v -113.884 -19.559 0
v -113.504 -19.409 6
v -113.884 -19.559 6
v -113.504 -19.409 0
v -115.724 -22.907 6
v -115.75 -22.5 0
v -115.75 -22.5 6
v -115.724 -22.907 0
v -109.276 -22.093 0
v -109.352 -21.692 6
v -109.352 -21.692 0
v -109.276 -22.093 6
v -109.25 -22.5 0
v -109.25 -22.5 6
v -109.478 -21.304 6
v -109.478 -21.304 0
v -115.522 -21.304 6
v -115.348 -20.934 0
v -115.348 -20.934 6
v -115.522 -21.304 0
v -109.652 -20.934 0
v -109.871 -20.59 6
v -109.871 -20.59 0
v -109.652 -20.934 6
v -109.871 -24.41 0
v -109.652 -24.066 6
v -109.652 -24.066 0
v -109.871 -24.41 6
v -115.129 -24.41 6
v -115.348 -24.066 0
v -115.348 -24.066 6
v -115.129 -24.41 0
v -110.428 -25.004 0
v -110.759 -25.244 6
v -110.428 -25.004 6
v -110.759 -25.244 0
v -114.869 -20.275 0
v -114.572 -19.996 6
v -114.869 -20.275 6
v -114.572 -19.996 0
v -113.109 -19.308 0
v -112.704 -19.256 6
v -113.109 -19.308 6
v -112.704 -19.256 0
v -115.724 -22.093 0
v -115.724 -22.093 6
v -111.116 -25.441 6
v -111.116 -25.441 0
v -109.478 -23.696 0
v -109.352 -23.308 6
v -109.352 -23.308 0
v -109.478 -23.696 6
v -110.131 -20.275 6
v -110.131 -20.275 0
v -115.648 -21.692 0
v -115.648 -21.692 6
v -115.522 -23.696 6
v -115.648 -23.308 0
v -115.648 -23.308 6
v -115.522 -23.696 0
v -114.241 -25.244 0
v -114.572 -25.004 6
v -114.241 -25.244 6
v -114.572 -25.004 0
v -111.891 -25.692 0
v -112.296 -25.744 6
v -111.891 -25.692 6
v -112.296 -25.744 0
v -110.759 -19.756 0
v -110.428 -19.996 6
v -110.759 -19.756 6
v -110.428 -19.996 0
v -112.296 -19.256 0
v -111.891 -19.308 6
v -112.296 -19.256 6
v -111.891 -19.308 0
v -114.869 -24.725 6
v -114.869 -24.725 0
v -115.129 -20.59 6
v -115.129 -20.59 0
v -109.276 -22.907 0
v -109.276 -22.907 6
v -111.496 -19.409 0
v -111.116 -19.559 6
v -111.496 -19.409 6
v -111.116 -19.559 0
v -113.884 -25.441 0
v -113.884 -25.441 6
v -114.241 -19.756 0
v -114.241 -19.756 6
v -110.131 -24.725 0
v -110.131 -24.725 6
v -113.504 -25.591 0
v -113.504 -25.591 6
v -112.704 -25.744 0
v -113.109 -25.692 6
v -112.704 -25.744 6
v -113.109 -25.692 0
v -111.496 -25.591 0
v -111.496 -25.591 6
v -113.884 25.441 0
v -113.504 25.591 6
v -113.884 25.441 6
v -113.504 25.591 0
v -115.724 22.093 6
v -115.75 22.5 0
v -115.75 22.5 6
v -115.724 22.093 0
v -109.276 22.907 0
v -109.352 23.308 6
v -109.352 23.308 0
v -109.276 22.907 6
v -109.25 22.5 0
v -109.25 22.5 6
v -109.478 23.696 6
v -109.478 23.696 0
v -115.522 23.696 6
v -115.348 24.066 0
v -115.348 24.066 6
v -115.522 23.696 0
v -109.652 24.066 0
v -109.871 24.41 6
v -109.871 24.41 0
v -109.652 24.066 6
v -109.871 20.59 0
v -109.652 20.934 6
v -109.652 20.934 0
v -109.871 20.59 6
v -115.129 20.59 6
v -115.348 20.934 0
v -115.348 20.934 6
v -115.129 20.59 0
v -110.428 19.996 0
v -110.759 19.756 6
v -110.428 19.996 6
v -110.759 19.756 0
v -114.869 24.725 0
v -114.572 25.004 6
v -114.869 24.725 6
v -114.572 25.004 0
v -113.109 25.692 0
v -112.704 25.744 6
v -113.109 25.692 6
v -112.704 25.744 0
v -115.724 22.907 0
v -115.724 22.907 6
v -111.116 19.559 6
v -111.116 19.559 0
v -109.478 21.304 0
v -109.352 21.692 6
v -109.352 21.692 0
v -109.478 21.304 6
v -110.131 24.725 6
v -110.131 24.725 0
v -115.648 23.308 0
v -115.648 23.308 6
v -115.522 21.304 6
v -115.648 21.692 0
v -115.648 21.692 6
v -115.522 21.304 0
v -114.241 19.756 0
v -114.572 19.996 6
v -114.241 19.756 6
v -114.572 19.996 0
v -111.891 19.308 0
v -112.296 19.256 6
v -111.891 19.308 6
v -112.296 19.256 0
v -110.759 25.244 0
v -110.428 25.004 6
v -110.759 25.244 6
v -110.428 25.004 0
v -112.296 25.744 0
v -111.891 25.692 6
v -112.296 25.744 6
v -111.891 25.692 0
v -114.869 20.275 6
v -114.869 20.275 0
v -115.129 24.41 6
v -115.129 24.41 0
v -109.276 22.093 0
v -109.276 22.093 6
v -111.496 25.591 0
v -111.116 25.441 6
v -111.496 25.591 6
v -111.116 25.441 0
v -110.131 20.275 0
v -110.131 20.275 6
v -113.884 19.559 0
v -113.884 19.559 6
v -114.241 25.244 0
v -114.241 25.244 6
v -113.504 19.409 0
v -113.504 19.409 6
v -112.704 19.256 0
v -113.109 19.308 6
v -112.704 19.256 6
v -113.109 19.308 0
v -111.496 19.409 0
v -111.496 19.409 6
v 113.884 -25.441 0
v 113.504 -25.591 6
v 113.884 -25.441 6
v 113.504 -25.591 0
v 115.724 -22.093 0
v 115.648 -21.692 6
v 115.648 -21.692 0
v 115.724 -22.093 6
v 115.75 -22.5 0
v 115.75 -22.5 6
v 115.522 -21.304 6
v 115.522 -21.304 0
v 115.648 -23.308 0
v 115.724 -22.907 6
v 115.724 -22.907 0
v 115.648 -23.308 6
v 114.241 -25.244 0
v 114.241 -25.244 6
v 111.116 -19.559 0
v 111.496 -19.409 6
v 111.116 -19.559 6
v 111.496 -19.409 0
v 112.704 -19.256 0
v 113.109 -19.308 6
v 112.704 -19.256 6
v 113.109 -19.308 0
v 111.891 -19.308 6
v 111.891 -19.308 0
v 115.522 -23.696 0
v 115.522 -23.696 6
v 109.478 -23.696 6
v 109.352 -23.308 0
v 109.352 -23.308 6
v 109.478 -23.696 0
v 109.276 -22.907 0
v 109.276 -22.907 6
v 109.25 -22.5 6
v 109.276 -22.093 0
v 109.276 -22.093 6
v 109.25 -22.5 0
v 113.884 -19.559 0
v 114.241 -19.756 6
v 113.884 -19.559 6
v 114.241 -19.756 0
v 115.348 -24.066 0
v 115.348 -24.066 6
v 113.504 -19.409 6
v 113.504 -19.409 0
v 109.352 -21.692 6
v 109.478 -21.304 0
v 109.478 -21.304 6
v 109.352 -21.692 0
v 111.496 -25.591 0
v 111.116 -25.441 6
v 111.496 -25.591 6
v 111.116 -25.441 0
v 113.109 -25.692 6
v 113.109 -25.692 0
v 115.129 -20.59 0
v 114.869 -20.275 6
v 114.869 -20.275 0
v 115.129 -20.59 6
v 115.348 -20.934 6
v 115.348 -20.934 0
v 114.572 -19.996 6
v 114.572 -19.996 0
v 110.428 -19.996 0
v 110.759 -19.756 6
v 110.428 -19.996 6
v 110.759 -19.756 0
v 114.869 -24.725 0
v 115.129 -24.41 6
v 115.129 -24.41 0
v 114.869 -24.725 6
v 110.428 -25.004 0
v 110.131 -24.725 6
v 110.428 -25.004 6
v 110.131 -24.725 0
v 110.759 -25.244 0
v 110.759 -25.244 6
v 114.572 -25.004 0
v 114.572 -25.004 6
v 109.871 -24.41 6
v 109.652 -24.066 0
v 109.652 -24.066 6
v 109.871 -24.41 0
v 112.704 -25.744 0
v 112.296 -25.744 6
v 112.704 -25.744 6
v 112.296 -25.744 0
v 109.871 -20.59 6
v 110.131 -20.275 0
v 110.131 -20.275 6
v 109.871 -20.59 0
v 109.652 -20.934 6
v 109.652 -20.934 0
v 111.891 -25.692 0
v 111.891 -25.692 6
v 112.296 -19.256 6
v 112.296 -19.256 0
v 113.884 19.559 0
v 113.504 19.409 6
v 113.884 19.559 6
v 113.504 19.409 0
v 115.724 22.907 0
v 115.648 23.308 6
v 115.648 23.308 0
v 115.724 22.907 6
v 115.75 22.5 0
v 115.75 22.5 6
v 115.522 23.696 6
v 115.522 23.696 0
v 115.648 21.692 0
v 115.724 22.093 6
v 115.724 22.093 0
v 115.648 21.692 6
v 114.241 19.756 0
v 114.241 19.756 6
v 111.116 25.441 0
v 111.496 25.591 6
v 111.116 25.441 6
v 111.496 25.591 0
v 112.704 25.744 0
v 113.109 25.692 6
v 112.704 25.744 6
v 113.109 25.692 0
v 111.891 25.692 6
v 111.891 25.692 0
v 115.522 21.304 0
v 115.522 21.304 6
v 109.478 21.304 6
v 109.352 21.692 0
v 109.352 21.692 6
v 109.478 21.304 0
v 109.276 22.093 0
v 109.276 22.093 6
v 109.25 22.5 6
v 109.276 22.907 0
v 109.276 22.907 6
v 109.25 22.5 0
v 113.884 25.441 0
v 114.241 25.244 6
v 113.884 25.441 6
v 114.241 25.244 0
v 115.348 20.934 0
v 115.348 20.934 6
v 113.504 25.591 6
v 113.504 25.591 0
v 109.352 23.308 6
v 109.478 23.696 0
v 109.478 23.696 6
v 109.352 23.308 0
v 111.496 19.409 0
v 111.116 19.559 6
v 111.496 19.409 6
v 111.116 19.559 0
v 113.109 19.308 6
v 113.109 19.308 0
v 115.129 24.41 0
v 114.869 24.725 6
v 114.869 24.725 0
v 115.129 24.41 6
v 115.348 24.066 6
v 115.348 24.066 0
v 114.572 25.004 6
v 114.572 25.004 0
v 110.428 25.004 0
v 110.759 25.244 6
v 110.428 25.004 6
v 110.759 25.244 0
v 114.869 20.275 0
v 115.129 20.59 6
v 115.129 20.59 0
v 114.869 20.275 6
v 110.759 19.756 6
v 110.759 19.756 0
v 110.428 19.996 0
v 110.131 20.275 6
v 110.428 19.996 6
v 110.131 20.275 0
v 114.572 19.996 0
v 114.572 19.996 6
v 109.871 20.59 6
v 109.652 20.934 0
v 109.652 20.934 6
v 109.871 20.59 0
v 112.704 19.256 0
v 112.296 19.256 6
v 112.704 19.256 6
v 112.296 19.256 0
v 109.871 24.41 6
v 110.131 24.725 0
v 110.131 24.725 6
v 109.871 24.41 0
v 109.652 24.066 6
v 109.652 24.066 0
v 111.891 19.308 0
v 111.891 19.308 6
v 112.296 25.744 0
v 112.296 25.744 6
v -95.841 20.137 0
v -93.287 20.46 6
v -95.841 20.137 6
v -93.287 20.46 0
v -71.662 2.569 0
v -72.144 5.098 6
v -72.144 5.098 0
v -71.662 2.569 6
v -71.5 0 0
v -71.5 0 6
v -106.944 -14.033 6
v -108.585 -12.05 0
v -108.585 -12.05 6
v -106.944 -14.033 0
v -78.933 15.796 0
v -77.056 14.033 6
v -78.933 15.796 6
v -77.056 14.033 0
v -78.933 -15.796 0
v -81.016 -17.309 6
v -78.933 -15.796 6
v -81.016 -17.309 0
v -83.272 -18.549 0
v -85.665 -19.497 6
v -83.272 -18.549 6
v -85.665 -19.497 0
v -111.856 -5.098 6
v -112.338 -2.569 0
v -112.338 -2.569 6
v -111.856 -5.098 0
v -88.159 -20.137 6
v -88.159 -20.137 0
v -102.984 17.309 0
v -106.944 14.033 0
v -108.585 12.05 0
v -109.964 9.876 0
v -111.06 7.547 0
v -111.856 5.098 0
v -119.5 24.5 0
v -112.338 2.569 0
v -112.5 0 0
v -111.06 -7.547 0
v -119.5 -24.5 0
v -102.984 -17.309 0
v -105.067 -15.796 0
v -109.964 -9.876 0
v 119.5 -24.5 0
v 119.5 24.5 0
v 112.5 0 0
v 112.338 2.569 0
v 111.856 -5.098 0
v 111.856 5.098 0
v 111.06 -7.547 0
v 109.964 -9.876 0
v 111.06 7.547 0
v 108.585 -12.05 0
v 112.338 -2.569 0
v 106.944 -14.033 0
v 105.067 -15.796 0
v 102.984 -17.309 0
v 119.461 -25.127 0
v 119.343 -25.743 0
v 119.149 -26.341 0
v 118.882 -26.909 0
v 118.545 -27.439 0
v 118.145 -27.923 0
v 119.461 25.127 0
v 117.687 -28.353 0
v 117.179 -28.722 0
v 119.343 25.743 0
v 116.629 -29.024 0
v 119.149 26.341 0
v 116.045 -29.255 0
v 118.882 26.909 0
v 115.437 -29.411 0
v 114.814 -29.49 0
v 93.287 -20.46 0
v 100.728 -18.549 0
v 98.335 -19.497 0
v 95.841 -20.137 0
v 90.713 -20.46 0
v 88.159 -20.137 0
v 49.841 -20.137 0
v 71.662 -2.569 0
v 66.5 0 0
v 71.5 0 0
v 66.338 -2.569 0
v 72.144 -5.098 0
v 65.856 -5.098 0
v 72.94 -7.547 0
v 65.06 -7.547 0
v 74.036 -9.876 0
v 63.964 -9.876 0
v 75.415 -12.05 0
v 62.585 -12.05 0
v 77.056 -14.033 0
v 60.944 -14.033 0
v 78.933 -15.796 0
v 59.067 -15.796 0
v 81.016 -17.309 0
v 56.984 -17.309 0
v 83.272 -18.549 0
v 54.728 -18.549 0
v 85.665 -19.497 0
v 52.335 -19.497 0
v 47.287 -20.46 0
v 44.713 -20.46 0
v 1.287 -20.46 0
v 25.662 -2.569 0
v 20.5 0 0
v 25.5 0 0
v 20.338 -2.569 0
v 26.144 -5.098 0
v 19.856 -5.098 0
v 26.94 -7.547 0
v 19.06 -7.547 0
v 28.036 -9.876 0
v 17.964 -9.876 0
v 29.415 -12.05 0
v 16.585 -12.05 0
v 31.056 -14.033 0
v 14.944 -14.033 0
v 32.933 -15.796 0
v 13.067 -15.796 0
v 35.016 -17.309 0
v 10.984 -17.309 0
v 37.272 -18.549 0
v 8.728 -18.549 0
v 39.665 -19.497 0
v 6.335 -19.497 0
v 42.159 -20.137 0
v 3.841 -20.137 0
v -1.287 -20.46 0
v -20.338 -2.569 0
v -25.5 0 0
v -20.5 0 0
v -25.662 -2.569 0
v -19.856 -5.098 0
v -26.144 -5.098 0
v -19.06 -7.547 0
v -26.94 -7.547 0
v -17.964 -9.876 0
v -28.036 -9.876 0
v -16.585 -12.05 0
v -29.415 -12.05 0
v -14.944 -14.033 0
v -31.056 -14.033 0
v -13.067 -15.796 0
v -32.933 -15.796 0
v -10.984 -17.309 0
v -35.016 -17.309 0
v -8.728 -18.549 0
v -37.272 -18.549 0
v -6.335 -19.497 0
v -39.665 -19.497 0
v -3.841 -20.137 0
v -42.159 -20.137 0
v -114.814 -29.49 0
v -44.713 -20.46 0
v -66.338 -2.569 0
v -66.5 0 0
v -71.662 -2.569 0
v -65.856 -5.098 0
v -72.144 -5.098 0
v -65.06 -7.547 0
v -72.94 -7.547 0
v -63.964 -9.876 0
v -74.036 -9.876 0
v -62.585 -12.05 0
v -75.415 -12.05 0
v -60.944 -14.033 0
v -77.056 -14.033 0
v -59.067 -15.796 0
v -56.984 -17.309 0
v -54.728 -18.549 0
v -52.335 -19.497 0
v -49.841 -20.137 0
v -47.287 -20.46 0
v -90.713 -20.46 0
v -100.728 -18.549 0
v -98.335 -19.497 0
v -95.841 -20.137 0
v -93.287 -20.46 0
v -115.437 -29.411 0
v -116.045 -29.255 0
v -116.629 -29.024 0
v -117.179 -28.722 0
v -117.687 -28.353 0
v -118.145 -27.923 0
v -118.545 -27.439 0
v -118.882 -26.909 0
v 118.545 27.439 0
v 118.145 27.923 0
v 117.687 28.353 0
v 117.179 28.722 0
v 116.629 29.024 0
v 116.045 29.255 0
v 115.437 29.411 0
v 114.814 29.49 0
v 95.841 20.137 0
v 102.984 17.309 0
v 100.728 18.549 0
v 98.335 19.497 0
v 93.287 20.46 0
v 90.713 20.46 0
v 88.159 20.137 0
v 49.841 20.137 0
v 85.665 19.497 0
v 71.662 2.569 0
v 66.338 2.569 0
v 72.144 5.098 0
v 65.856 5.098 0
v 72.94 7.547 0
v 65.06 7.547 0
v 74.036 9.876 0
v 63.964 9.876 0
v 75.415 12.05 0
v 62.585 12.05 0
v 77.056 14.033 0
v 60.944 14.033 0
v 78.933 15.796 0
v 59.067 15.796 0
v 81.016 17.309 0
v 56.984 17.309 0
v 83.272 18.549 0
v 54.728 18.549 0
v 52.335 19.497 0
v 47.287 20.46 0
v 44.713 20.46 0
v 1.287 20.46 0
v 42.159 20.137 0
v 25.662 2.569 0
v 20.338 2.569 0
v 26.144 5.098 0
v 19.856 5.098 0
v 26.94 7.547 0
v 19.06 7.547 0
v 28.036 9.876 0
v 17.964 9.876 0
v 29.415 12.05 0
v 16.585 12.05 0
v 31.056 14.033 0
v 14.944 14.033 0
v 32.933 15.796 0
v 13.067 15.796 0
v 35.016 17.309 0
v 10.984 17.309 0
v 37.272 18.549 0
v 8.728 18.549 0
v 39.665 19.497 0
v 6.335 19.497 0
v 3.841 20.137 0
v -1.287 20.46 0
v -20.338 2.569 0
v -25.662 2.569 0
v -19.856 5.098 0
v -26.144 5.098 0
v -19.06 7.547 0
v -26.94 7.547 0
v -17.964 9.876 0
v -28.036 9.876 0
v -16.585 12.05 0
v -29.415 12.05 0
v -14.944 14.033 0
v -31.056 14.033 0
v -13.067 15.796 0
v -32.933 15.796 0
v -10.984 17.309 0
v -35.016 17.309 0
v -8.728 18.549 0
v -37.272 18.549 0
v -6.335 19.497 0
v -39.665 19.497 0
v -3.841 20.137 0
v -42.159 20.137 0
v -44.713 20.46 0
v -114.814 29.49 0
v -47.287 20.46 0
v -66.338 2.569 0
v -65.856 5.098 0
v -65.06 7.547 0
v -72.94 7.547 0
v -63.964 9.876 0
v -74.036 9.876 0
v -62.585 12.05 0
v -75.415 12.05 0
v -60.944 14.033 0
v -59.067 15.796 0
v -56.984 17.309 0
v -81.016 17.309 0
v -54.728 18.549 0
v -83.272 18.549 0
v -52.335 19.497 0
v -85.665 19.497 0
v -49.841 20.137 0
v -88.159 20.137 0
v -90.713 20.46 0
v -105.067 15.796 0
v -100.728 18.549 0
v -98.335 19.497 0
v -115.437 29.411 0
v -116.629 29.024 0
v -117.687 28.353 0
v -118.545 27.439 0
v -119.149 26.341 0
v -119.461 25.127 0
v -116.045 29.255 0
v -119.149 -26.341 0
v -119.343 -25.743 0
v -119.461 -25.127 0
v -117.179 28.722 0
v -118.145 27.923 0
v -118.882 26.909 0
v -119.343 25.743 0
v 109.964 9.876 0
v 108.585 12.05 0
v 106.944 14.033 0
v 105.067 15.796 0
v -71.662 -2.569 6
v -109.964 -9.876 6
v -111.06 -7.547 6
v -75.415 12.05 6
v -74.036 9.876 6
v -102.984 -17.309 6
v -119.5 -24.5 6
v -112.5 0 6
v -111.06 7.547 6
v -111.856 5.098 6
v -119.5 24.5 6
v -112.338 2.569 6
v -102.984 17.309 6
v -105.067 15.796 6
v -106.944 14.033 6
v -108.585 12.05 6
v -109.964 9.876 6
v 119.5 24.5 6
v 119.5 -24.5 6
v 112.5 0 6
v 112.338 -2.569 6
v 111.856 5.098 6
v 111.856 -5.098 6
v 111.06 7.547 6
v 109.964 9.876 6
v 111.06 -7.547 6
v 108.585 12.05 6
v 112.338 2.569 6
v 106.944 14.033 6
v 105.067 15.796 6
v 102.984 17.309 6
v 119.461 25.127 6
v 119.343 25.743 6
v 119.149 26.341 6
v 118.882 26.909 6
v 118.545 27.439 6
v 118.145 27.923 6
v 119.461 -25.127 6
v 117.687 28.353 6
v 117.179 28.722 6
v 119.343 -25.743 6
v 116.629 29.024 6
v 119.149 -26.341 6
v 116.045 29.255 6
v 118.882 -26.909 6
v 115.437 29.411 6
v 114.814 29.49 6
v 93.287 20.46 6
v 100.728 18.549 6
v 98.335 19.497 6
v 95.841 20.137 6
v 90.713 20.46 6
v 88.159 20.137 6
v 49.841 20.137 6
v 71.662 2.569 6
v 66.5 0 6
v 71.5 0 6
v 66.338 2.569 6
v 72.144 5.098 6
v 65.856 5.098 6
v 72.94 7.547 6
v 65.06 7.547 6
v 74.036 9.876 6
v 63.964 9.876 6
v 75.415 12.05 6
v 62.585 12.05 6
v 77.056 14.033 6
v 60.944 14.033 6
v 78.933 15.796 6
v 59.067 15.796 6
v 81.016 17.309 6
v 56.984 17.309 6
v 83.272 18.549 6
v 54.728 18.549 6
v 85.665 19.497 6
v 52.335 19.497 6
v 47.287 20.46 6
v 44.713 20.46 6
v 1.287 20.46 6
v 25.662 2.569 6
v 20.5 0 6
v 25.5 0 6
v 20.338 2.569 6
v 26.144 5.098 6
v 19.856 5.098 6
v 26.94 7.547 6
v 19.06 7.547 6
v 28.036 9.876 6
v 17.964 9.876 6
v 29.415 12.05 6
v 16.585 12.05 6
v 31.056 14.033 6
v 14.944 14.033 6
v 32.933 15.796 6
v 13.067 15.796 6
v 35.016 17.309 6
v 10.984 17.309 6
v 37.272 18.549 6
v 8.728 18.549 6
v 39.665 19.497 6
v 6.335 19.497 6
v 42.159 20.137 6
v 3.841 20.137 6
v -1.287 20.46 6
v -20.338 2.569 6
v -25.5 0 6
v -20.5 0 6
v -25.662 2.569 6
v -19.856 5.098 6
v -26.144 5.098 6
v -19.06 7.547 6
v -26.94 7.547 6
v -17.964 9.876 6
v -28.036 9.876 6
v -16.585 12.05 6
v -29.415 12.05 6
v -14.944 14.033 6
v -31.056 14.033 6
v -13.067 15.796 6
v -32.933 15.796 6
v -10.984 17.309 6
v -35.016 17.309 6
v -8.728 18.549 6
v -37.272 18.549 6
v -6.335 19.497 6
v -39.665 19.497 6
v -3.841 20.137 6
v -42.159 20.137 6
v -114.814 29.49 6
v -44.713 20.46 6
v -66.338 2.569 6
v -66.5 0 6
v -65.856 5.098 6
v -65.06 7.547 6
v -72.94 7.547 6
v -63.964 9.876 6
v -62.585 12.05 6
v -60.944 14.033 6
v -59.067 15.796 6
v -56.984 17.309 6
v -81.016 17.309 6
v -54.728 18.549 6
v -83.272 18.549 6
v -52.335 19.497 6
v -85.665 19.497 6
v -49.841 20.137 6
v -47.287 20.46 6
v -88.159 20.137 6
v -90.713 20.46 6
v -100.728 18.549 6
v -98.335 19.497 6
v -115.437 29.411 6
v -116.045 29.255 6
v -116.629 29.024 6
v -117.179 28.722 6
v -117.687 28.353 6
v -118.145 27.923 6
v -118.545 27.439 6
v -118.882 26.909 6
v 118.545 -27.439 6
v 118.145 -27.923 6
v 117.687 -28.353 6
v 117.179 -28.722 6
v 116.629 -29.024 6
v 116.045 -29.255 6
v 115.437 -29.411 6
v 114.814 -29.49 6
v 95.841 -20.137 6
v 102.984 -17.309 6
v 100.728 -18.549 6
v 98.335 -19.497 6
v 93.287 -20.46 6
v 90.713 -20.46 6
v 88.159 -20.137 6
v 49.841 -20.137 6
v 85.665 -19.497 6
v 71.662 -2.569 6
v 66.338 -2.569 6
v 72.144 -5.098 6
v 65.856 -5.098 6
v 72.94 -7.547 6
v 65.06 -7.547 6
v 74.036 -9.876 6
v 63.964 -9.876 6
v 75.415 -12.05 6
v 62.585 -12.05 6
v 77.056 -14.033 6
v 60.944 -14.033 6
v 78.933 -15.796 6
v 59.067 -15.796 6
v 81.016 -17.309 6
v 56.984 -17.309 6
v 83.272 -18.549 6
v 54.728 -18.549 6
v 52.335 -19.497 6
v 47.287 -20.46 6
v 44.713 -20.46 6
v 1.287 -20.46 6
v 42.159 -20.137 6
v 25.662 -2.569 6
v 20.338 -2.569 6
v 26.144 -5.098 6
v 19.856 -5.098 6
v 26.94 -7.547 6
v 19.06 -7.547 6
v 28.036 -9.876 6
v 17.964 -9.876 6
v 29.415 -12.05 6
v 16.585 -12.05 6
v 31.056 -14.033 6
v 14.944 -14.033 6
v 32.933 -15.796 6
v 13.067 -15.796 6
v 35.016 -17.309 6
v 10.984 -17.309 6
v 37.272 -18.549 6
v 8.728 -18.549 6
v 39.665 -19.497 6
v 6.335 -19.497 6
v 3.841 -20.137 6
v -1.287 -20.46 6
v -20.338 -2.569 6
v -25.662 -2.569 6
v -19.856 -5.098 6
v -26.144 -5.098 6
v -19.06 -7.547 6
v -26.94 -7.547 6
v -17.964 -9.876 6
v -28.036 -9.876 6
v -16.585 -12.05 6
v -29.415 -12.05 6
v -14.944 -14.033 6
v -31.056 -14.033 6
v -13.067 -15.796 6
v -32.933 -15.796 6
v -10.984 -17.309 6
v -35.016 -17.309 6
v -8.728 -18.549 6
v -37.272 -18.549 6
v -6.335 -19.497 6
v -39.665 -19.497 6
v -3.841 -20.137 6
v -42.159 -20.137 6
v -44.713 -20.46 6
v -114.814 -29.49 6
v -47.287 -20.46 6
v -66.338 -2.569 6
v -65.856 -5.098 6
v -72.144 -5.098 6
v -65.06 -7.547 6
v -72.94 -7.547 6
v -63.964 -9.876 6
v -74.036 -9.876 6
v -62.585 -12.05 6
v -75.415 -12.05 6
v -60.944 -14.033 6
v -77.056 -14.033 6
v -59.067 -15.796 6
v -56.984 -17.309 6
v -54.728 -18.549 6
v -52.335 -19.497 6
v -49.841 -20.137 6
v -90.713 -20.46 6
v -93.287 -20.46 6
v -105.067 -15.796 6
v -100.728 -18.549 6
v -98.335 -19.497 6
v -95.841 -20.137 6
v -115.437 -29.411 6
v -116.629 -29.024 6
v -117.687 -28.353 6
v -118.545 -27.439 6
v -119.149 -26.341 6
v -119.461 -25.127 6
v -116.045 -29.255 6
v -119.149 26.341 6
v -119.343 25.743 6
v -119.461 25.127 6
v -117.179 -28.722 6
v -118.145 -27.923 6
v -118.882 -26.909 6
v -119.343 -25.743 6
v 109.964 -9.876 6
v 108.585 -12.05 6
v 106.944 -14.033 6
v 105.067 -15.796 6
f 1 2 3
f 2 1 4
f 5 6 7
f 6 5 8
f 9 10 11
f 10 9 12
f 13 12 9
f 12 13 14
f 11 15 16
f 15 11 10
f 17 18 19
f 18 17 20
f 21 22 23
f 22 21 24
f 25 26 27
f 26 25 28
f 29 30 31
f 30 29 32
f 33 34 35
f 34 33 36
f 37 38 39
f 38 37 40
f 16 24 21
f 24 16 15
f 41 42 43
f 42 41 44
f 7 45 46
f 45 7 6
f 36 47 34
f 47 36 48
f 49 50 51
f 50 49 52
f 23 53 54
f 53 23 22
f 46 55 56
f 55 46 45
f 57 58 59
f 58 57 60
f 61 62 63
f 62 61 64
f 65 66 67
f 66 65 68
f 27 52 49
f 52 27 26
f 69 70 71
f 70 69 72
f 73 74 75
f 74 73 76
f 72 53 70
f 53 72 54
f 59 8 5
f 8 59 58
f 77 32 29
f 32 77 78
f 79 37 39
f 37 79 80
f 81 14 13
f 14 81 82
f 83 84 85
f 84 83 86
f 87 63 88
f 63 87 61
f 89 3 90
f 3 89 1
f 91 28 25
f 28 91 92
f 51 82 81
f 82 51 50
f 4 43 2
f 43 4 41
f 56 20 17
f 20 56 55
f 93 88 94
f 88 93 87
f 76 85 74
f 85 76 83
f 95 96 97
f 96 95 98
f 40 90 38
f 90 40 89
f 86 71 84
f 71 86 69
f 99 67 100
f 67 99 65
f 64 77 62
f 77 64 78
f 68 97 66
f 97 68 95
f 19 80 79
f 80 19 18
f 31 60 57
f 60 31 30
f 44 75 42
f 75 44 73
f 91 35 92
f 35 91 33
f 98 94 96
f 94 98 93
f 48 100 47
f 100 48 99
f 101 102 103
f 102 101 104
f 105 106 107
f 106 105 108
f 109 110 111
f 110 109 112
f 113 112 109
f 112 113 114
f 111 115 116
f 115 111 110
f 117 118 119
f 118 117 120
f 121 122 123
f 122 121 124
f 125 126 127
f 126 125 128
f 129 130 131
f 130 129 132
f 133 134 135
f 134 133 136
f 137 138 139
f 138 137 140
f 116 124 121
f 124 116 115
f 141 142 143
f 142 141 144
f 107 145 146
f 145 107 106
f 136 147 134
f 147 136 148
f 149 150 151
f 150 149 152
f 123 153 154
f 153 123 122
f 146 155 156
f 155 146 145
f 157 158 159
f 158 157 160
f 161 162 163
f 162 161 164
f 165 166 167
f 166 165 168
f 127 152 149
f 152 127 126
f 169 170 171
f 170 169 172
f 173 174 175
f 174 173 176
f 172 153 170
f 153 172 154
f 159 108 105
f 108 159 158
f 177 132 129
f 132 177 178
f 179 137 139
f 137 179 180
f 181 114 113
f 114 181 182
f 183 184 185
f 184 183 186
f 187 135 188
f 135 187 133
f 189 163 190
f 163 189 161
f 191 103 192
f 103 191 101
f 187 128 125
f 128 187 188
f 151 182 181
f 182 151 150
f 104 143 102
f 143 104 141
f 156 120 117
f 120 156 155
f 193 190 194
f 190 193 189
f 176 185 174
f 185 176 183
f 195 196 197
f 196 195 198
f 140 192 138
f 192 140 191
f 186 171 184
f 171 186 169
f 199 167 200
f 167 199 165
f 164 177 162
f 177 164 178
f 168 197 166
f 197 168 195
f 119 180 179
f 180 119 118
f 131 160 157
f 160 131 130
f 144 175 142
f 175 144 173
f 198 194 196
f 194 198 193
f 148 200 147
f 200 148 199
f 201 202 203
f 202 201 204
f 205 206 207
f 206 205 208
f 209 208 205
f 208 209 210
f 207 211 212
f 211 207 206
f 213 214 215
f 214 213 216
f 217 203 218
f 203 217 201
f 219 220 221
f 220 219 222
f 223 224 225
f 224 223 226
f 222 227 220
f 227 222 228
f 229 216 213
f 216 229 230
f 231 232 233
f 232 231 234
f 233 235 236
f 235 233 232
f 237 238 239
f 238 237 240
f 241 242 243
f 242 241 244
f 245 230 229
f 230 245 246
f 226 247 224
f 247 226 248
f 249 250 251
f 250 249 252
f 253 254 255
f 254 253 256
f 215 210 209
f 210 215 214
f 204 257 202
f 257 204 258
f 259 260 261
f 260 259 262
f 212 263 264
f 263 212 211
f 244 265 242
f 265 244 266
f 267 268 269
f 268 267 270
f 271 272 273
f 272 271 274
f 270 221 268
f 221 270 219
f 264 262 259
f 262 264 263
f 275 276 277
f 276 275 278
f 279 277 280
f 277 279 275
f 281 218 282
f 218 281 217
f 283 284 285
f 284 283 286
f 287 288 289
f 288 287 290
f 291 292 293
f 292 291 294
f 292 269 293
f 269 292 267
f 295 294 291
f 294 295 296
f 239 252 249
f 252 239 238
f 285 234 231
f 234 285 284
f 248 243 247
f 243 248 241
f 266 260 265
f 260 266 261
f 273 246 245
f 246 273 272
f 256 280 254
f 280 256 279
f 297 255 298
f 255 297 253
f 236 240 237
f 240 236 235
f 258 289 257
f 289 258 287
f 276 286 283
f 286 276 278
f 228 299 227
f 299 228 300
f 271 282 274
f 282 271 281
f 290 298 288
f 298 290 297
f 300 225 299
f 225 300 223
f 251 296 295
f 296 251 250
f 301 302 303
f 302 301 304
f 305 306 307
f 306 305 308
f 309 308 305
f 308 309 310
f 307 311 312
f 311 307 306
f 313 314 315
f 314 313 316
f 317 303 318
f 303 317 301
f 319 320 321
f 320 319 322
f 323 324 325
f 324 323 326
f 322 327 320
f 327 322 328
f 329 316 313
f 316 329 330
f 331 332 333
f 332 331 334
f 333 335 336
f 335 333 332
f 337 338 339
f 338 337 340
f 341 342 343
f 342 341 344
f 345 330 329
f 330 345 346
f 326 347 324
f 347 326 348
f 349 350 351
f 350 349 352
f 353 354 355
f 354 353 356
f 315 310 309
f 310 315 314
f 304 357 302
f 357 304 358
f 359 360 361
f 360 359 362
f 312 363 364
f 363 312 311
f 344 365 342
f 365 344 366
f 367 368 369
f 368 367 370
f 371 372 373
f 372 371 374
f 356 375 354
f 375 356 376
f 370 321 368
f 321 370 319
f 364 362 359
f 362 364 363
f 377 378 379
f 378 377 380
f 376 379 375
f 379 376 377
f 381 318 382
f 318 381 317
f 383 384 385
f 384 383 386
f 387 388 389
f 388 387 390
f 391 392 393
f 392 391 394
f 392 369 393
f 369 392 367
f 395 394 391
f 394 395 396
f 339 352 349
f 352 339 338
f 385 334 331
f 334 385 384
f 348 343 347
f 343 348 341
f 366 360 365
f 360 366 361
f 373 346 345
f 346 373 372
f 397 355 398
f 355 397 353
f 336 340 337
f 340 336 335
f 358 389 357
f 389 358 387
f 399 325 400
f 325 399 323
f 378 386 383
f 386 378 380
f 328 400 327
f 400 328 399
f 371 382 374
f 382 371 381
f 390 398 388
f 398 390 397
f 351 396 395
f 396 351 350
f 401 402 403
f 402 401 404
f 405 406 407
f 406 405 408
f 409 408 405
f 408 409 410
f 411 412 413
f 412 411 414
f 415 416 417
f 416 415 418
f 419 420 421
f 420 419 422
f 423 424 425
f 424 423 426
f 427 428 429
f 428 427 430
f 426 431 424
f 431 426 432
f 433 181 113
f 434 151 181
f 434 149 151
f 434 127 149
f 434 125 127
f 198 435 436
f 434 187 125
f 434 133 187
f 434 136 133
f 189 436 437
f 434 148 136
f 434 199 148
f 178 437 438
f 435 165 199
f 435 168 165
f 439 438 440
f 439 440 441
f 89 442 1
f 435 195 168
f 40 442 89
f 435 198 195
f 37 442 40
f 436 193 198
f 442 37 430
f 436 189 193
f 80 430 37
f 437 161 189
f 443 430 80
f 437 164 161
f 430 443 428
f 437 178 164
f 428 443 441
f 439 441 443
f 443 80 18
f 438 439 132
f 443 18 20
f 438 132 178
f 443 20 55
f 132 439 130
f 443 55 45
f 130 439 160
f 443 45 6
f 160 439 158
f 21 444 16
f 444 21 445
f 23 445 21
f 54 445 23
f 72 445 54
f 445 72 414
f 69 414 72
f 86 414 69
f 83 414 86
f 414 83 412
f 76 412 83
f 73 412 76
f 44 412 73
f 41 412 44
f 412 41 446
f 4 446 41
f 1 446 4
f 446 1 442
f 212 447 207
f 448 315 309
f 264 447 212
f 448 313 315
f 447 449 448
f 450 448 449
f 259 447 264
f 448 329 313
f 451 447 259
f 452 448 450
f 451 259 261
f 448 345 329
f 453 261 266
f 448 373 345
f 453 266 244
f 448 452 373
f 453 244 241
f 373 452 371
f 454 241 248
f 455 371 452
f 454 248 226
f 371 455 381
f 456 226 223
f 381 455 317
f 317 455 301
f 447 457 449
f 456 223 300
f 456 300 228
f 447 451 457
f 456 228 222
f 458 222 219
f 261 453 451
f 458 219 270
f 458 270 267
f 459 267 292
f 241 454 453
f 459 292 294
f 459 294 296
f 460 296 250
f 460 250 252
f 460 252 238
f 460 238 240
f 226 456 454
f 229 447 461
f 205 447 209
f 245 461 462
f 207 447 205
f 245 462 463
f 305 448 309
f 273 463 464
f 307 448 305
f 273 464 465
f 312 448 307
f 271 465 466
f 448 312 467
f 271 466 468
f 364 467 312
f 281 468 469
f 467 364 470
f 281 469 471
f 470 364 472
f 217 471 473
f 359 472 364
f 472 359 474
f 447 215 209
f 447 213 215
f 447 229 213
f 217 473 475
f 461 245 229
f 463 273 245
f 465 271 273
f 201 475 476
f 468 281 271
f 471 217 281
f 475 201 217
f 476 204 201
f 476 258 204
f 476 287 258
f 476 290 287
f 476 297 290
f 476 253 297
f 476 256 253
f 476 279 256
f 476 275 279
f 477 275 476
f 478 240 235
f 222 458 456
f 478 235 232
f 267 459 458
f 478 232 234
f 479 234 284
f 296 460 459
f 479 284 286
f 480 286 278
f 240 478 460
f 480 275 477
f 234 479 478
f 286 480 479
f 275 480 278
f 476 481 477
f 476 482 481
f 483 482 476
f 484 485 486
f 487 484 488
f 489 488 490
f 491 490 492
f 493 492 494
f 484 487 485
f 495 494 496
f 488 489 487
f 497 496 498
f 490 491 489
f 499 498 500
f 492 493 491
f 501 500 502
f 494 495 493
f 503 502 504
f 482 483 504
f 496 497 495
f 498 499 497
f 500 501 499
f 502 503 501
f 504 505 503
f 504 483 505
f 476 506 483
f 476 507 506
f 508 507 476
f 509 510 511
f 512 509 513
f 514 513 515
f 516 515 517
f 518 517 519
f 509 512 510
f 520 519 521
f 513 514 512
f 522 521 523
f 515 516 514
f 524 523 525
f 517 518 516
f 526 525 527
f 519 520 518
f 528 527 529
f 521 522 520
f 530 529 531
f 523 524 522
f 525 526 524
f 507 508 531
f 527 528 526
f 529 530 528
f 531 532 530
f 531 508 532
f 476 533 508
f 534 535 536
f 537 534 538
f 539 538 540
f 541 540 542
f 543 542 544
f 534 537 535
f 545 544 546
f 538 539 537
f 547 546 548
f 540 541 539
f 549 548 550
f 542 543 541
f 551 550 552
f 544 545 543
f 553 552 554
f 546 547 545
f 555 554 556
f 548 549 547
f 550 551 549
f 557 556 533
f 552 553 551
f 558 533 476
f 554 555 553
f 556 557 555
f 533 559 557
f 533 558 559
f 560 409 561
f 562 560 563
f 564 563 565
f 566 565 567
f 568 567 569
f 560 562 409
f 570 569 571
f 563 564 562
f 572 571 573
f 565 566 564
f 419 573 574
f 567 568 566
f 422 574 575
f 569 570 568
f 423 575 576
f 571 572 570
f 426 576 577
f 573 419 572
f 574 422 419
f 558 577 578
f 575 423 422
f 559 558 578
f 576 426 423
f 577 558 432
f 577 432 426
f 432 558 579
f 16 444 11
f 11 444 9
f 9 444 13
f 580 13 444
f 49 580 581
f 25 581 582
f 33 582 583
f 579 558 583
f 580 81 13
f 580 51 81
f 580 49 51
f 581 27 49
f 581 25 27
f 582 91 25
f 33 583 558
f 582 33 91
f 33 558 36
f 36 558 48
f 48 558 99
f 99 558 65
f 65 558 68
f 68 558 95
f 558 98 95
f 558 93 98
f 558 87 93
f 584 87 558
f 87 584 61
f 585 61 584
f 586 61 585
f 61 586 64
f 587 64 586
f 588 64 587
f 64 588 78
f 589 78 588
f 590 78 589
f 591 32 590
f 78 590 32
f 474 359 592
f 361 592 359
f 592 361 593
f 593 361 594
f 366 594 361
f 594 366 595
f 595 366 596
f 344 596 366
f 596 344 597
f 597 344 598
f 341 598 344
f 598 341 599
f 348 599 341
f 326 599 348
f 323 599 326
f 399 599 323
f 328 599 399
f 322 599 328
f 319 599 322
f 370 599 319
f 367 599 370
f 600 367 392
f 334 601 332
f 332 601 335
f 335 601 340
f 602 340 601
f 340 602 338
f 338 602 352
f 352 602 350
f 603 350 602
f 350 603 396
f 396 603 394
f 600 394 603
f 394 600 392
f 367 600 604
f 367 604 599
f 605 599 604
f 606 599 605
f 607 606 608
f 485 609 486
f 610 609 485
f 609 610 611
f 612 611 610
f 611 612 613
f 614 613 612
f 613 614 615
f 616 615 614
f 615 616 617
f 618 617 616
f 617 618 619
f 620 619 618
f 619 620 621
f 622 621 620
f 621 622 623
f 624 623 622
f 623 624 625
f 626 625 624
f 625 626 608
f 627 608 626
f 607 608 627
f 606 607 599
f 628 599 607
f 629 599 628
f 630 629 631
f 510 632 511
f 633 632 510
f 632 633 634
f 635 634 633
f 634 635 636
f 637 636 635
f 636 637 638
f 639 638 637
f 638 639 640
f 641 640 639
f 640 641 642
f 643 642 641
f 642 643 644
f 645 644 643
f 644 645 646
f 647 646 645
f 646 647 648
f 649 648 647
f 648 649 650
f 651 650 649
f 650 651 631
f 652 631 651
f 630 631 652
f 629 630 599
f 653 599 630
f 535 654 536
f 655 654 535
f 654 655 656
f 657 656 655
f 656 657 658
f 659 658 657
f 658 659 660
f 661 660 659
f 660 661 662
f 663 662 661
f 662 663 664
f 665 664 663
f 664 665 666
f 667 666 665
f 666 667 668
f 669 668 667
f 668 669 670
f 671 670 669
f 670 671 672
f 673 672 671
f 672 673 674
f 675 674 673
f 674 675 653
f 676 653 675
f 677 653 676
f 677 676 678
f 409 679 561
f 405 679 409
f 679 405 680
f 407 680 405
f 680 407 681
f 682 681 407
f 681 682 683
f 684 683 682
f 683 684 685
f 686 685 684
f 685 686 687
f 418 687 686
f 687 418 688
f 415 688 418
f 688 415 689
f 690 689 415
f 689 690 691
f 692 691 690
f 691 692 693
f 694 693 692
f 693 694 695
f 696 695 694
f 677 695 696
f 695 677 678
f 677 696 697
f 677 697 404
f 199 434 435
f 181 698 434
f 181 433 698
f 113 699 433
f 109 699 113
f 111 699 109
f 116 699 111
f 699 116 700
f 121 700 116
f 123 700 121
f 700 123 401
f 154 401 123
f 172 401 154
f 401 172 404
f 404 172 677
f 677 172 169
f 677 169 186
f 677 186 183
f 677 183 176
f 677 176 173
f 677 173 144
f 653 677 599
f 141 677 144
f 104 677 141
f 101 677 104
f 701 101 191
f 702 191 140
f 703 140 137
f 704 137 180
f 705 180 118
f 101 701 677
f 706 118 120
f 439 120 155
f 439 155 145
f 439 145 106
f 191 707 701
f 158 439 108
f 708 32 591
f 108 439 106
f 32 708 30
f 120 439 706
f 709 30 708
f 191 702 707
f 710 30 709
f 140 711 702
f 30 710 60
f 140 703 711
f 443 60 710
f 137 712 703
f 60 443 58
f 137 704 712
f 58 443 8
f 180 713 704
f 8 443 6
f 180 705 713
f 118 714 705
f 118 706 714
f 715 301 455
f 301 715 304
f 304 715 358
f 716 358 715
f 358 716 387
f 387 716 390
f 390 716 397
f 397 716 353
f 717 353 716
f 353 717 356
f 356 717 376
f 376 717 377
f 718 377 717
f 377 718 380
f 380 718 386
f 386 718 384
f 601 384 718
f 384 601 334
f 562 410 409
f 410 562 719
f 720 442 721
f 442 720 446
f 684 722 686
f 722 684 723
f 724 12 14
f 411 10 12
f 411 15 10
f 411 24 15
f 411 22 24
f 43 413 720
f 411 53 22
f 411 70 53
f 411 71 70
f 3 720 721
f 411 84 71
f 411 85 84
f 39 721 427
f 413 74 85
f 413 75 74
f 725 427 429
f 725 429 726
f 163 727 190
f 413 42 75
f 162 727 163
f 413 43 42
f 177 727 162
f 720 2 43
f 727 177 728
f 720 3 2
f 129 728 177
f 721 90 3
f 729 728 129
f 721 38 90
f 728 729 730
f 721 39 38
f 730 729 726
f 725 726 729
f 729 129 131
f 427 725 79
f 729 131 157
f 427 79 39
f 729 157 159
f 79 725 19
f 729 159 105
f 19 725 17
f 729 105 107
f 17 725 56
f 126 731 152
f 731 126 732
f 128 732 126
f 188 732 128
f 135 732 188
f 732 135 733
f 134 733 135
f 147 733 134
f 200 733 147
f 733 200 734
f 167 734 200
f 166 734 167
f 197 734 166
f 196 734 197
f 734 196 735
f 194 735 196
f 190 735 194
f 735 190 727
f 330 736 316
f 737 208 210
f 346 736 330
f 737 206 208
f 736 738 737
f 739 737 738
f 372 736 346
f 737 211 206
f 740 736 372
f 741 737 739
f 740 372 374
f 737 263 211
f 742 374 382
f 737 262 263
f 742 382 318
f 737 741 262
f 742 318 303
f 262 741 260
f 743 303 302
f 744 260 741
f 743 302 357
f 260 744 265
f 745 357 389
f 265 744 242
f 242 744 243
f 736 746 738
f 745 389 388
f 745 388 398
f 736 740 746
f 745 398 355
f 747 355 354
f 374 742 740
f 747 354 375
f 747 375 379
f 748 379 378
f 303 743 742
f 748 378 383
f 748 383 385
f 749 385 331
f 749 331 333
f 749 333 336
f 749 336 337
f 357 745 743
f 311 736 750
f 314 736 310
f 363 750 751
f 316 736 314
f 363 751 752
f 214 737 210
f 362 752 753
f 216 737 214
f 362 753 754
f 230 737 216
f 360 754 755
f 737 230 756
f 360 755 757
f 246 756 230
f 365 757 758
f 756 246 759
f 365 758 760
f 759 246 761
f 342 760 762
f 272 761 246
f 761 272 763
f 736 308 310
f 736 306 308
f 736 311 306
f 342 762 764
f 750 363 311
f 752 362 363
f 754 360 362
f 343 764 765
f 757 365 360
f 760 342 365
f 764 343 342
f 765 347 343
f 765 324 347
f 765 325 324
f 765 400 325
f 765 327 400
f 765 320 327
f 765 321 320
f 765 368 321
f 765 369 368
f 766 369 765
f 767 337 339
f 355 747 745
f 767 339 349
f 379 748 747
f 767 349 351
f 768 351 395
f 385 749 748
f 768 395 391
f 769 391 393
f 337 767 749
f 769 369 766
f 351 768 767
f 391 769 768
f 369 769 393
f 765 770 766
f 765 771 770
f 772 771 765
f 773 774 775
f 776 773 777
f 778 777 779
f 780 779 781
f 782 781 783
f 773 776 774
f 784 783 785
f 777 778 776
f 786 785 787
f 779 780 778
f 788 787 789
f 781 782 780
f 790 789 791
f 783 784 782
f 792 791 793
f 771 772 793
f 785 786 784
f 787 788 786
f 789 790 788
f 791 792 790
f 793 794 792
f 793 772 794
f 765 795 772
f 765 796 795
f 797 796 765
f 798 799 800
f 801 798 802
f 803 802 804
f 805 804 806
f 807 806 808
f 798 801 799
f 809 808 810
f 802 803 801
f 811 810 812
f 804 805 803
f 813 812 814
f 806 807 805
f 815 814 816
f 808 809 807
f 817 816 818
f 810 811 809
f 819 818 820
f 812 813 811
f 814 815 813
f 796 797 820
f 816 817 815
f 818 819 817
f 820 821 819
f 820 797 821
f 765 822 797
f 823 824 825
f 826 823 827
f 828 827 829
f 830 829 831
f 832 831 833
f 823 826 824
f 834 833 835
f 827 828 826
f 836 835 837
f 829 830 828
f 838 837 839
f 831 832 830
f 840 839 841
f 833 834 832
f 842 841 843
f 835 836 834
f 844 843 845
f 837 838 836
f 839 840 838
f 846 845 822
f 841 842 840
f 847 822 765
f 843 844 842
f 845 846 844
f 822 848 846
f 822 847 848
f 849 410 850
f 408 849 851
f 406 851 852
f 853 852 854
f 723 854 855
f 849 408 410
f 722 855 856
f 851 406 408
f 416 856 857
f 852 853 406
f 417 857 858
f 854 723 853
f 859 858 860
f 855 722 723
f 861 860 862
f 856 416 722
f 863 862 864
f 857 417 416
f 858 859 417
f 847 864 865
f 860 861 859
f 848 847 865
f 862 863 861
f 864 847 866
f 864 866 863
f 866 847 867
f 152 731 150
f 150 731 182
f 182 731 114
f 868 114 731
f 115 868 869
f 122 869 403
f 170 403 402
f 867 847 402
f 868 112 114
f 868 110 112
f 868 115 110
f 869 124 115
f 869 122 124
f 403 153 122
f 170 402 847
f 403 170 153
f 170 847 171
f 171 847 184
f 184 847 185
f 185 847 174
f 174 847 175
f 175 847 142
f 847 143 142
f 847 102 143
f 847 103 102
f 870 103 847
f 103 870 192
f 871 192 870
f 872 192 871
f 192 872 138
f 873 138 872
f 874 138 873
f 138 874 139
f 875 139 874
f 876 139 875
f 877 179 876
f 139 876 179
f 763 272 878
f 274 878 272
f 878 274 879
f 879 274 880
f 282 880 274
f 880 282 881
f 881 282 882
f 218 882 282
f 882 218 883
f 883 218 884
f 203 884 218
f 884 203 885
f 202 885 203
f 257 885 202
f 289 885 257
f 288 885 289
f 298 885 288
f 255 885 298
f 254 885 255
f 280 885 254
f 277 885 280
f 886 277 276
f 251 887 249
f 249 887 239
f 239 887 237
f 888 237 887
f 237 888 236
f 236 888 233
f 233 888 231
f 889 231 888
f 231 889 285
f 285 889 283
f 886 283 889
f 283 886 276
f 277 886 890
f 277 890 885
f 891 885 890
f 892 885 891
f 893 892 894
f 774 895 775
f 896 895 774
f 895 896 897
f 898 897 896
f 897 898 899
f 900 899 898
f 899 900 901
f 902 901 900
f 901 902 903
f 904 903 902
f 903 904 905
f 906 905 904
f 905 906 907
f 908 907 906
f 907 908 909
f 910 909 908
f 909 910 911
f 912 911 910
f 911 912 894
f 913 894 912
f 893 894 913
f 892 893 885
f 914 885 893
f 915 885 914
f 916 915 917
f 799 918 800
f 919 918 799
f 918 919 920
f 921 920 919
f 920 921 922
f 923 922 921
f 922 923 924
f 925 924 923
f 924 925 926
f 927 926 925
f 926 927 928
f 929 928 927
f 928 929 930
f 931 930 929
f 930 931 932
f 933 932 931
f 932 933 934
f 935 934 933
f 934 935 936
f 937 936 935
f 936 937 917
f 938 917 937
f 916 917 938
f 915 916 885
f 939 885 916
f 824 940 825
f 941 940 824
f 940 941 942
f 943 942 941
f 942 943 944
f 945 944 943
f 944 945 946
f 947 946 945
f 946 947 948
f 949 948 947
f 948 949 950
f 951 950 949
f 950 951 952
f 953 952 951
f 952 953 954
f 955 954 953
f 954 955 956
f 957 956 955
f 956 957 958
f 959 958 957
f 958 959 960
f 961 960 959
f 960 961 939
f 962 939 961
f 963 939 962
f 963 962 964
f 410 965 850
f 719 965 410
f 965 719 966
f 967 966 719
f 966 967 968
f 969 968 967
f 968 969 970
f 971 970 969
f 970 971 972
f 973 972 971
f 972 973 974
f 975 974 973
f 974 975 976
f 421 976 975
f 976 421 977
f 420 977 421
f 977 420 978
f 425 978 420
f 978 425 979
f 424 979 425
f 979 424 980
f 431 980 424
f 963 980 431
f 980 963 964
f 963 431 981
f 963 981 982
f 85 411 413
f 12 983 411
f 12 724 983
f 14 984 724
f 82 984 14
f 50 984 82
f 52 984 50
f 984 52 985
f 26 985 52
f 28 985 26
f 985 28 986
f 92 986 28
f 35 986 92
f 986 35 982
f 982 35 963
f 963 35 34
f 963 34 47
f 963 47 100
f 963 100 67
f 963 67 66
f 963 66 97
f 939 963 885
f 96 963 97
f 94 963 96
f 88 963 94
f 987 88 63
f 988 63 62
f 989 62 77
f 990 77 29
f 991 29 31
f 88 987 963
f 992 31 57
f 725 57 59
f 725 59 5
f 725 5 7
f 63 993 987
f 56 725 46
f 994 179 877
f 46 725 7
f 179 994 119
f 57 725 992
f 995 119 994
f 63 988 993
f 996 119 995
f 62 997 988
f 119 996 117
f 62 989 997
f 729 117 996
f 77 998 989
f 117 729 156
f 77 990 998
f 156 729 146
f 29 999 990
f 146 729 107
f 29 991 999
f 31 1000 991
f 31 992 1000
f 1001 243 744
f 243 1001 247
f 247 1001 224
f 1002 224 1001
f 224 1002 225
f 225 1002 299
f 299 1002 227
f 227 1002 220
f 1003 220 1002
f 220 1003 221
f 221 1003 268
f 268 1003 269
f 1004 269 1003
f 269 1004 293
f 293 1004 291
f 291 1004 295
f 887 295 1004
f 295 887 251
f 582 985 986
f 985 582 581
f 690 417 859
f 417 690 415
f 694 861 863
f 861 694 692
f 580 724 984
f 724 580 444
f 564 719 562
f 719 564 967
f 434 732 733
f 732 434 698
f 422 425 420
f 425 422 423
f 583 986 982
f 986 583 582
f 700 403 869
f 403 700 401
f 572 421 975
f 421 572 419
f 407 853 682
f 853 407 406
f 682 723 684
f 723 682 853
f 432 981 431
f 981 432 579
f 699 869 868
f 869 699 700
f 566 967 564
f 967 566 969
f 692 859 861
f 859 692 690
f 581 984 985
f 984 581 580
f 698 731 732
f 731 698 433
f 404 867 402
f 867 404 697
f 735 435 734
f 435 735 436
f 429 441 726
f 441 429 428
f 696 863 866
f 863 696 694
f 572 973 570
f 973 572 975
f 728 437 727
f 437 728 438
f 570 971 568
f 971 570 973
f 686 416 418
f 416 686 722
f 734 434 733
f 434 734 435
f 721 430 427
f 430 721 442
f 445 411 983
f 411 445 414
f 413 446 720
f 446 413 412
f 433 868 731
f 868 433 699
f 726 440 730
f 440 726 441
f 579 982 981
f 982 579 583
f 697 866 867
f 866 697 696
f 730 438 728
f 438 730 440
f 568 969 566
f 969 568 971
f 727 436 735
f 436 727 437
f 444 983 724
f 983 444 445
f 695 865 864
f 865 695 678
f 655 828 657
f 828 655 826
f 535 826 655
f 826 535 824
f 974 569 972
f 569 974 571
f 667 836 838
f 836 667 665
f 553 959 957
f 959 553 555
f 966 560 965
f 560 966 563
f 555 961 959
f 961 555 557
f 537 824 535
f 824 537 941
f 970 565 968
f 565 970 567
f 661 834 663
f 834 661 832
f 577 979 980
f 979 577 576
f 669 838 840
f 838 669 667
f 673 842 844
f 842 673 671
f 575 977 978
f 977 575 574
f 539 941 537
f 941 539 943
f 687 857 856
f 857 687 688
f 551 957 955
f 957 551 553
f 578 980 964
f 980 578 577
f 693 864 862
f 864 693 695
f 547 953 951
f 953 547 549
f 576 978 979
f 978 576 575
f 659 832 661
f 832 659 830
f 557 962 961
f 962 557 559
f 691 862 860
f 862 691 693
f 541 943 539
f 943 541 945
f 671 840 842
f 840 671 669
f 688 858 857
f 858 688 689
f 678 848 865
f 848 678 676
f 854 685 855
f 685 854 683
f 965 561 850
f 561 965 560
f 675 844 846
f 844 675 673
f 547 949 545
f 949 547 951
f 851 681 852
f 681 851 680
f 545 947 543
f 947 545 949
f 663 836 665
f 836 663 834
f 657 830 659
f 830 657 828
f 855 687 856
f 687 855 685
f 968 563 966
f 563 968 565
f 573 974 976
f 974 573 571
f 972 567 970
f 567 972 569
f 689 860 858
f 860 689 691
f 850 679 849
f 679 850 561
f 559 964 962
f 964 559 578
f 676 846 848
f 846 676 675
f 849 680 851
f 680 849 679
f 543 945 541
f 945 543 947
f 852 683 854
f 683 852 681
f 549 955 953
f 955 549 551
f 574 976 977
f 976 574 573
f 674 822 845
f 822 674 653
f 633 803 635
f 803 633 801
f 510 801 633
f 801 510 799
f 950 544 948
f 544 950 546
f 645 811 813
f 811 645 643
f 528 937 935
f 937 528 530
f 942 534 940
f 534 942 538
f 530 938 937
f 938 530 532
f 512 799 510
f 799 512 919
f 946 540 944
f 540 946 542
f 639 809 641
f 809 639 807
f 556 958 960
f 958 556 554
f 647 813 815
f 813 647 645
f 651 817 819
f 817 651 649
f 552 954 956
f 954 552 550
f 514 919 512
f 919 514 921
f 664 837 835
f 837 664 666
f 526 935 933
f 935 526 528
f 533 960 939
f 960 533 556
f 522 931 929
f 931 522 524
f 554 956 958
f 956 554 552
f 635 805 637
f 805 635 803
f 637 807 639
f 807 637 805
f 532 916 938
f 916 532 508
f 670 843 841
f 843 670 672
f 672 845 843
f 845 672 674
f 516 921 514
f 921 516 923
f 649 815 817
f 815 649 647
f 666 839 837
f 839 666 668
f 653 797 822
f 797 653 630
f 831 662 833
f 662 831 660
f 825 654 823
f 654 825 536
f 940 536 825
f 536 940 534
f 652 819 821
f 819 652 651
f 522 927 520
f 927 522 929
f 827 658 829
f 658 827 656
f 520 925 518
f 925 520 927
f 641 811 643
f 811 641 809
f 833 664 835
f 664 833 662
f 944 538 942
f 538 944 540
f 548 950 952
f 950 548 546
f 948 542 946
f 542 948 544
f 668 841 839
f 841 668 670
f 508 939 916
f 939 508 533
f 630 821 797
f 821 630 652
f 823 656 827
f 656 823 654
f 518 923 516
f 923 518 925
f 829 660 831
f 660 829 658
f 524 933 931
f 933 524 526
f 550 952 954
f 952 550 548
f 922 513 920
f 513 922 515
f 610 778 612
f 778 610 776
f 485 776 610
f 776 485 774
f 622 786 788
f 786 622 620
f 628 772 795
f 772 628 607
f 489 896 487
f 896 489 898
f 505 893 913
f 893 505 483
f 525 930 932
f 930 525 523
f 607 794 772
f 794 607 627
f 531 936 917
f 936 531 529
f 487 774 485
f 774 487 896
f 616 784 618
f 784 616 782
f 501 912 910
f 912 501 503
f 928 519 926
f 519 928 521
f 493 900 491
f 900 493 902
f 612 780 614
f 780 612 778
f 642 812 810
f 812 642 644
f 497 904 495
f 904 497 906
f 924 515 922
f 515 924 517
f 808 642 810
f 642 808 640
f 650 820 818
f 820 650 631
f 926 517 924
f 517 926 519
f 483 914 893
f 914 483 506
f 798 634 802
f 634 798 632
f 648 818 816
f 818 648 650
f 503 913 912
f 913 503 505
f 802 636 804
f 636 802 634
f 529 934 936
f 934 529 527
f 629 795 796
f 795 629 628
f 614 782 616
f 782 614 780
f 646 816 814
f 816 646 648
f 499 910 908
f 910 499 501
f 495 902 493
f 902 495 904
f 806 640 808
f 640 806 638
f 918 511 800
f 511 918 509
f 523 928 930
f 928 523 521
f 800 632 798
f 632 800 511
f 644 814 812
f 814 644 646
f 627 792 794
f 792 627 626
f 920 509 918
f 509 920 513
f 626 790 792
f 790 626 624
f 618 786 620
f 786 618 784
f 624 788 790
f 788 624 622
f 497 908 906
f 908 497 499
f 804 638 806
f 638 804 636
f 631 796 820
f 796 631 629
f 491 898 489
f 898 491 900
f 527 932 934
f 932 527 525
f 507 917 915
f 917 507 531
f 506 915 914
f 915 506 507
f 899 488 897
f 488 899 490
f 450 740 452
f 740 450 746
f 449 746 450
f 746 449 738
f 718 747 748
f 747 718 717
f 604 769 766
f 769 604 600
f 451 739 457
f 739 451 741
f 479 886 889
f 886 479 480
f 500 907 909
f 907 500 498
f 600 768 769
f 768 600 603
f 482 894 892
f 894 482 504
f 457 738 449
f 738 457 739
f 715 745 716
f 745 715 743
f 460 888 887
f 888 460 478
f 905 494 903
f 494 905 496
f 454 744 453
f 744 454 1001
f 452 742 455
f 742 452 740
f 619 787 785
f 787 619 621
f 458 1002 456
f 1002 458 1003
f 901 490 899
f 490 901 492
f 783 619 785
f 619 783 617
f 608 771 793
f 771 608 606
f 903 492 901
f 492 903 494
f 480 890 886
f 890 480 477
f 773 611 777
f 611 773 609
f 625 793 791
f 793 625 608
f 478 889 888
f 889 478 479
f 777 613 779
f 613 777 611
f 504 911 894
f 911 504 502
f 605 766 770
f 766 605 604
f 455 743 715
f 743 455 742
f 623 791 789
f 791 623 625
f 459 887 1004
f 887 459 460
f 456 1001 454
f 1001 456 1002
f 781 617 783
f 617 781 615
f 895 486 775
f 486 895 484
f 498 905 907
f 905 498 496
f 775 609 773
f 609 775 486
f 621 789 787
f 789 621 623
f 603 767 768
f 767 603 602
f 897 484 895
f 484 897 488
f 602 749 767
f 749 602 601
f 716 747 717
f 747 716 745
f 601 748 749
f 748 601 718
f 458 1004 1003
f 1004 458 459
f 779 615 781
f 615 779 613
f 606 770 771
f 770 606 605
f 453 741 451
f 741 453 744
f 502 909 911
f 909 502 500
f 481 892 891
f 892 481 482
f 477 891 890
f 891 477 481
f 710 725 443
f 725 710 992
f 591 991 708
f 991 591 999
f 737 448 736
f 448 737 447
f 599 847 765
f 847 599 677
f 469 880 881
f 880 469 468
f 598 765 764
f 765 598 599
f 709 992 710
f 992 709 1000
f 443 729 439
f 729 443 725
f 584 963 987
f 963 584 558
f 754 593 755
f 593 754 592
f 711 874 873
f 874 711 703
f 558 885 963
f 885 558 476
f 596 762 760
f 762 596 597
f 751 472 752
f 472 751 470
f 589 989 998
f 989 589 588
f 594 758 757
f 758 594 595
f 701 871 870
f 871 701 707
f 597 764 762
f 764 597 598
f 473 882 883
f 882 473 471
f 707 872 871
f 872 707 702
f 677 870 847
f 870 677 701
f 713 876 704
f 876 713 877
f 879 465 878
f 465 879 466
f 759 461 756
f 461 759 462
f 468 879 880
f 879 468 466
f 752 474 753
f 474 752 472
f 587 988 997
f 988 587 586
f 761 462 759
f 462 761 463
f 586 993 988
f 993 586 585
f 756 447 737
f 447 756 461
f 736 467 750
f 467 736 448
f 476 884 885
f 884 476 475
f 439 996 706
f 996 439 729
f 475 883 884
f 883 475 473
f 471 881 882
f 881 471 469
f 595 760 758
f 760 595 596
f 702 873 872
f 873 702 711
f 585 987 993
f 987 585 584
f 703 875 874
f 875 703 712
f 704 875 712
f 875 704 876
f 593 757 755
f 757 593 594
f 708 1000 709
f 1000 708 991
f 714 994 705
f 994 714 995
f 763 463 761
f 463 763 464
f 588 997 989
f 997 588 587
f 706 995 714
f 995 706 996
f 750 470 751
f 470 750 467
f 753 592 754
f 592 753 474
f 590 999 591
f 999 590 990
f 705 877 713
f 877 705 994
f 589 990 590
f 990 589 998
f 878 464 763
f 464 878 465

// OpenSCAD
$fn = 50;


difference() {
	union() {
		hull() {
			translate(v = [-114.5000000000, 24.5000000000, 0]) {
				cylinder(h = 6, r = 5);
			}
			translate(v = [114.5000000000, 24.5000000000, 0]) {
				cylinder(h = 6, r = 5);
			}
			translate(v = [-114.5000000000, -24.5000000000, 0]) {
				cylinder(h = 6, r = 5);
			}
			translate(v = [114.5000000000, -24.5000000000, 0]) {
				cylinder(h = 6, r = 5);
			}
		}
	}
	union() {
		#translate(v = [-112.5000000000, -22.5000000000, -100.0000000000]) {
			cylinder(h = 200, r = 3.2500000000);
		}
		#translate(v = [-112.5000000000, 22.5000000000, -100.0000000000]) {
			cylinder(h = 200, r = 3.2500000000);
		}
		#translate(v = [112.5000000000, -22.5000000000, -100.0000000000]) {
			cylinder(h = 200, r = 3.2500000000);
		}
		#translate(v = [112.5000000000, 22.5000000000, -100.0000000000]) {
			cylinder(h = 200, r = 3.2500000000);
		}
		#translate(v = [-92.0000000000, 0, 0]) {
			cylinder(h = 6, r = 20.5000000000);
		}
		#translate(v = [-46.0000000000, 0, 0]) {
			cylinder(h = 6, r = 20.5000000000);
		}
		#cylinder(h = 6, r = 20.5000000000);
		#translate(v = [46.0000000000, 0, 0]) {
			cylinder(h = 6, r = 20.5000000000);
		}
		#translate(v = [92.0000000000, 0, 0]) {
			cylinder(h = 6, r = 20.5000000000);
		}
	}
}
